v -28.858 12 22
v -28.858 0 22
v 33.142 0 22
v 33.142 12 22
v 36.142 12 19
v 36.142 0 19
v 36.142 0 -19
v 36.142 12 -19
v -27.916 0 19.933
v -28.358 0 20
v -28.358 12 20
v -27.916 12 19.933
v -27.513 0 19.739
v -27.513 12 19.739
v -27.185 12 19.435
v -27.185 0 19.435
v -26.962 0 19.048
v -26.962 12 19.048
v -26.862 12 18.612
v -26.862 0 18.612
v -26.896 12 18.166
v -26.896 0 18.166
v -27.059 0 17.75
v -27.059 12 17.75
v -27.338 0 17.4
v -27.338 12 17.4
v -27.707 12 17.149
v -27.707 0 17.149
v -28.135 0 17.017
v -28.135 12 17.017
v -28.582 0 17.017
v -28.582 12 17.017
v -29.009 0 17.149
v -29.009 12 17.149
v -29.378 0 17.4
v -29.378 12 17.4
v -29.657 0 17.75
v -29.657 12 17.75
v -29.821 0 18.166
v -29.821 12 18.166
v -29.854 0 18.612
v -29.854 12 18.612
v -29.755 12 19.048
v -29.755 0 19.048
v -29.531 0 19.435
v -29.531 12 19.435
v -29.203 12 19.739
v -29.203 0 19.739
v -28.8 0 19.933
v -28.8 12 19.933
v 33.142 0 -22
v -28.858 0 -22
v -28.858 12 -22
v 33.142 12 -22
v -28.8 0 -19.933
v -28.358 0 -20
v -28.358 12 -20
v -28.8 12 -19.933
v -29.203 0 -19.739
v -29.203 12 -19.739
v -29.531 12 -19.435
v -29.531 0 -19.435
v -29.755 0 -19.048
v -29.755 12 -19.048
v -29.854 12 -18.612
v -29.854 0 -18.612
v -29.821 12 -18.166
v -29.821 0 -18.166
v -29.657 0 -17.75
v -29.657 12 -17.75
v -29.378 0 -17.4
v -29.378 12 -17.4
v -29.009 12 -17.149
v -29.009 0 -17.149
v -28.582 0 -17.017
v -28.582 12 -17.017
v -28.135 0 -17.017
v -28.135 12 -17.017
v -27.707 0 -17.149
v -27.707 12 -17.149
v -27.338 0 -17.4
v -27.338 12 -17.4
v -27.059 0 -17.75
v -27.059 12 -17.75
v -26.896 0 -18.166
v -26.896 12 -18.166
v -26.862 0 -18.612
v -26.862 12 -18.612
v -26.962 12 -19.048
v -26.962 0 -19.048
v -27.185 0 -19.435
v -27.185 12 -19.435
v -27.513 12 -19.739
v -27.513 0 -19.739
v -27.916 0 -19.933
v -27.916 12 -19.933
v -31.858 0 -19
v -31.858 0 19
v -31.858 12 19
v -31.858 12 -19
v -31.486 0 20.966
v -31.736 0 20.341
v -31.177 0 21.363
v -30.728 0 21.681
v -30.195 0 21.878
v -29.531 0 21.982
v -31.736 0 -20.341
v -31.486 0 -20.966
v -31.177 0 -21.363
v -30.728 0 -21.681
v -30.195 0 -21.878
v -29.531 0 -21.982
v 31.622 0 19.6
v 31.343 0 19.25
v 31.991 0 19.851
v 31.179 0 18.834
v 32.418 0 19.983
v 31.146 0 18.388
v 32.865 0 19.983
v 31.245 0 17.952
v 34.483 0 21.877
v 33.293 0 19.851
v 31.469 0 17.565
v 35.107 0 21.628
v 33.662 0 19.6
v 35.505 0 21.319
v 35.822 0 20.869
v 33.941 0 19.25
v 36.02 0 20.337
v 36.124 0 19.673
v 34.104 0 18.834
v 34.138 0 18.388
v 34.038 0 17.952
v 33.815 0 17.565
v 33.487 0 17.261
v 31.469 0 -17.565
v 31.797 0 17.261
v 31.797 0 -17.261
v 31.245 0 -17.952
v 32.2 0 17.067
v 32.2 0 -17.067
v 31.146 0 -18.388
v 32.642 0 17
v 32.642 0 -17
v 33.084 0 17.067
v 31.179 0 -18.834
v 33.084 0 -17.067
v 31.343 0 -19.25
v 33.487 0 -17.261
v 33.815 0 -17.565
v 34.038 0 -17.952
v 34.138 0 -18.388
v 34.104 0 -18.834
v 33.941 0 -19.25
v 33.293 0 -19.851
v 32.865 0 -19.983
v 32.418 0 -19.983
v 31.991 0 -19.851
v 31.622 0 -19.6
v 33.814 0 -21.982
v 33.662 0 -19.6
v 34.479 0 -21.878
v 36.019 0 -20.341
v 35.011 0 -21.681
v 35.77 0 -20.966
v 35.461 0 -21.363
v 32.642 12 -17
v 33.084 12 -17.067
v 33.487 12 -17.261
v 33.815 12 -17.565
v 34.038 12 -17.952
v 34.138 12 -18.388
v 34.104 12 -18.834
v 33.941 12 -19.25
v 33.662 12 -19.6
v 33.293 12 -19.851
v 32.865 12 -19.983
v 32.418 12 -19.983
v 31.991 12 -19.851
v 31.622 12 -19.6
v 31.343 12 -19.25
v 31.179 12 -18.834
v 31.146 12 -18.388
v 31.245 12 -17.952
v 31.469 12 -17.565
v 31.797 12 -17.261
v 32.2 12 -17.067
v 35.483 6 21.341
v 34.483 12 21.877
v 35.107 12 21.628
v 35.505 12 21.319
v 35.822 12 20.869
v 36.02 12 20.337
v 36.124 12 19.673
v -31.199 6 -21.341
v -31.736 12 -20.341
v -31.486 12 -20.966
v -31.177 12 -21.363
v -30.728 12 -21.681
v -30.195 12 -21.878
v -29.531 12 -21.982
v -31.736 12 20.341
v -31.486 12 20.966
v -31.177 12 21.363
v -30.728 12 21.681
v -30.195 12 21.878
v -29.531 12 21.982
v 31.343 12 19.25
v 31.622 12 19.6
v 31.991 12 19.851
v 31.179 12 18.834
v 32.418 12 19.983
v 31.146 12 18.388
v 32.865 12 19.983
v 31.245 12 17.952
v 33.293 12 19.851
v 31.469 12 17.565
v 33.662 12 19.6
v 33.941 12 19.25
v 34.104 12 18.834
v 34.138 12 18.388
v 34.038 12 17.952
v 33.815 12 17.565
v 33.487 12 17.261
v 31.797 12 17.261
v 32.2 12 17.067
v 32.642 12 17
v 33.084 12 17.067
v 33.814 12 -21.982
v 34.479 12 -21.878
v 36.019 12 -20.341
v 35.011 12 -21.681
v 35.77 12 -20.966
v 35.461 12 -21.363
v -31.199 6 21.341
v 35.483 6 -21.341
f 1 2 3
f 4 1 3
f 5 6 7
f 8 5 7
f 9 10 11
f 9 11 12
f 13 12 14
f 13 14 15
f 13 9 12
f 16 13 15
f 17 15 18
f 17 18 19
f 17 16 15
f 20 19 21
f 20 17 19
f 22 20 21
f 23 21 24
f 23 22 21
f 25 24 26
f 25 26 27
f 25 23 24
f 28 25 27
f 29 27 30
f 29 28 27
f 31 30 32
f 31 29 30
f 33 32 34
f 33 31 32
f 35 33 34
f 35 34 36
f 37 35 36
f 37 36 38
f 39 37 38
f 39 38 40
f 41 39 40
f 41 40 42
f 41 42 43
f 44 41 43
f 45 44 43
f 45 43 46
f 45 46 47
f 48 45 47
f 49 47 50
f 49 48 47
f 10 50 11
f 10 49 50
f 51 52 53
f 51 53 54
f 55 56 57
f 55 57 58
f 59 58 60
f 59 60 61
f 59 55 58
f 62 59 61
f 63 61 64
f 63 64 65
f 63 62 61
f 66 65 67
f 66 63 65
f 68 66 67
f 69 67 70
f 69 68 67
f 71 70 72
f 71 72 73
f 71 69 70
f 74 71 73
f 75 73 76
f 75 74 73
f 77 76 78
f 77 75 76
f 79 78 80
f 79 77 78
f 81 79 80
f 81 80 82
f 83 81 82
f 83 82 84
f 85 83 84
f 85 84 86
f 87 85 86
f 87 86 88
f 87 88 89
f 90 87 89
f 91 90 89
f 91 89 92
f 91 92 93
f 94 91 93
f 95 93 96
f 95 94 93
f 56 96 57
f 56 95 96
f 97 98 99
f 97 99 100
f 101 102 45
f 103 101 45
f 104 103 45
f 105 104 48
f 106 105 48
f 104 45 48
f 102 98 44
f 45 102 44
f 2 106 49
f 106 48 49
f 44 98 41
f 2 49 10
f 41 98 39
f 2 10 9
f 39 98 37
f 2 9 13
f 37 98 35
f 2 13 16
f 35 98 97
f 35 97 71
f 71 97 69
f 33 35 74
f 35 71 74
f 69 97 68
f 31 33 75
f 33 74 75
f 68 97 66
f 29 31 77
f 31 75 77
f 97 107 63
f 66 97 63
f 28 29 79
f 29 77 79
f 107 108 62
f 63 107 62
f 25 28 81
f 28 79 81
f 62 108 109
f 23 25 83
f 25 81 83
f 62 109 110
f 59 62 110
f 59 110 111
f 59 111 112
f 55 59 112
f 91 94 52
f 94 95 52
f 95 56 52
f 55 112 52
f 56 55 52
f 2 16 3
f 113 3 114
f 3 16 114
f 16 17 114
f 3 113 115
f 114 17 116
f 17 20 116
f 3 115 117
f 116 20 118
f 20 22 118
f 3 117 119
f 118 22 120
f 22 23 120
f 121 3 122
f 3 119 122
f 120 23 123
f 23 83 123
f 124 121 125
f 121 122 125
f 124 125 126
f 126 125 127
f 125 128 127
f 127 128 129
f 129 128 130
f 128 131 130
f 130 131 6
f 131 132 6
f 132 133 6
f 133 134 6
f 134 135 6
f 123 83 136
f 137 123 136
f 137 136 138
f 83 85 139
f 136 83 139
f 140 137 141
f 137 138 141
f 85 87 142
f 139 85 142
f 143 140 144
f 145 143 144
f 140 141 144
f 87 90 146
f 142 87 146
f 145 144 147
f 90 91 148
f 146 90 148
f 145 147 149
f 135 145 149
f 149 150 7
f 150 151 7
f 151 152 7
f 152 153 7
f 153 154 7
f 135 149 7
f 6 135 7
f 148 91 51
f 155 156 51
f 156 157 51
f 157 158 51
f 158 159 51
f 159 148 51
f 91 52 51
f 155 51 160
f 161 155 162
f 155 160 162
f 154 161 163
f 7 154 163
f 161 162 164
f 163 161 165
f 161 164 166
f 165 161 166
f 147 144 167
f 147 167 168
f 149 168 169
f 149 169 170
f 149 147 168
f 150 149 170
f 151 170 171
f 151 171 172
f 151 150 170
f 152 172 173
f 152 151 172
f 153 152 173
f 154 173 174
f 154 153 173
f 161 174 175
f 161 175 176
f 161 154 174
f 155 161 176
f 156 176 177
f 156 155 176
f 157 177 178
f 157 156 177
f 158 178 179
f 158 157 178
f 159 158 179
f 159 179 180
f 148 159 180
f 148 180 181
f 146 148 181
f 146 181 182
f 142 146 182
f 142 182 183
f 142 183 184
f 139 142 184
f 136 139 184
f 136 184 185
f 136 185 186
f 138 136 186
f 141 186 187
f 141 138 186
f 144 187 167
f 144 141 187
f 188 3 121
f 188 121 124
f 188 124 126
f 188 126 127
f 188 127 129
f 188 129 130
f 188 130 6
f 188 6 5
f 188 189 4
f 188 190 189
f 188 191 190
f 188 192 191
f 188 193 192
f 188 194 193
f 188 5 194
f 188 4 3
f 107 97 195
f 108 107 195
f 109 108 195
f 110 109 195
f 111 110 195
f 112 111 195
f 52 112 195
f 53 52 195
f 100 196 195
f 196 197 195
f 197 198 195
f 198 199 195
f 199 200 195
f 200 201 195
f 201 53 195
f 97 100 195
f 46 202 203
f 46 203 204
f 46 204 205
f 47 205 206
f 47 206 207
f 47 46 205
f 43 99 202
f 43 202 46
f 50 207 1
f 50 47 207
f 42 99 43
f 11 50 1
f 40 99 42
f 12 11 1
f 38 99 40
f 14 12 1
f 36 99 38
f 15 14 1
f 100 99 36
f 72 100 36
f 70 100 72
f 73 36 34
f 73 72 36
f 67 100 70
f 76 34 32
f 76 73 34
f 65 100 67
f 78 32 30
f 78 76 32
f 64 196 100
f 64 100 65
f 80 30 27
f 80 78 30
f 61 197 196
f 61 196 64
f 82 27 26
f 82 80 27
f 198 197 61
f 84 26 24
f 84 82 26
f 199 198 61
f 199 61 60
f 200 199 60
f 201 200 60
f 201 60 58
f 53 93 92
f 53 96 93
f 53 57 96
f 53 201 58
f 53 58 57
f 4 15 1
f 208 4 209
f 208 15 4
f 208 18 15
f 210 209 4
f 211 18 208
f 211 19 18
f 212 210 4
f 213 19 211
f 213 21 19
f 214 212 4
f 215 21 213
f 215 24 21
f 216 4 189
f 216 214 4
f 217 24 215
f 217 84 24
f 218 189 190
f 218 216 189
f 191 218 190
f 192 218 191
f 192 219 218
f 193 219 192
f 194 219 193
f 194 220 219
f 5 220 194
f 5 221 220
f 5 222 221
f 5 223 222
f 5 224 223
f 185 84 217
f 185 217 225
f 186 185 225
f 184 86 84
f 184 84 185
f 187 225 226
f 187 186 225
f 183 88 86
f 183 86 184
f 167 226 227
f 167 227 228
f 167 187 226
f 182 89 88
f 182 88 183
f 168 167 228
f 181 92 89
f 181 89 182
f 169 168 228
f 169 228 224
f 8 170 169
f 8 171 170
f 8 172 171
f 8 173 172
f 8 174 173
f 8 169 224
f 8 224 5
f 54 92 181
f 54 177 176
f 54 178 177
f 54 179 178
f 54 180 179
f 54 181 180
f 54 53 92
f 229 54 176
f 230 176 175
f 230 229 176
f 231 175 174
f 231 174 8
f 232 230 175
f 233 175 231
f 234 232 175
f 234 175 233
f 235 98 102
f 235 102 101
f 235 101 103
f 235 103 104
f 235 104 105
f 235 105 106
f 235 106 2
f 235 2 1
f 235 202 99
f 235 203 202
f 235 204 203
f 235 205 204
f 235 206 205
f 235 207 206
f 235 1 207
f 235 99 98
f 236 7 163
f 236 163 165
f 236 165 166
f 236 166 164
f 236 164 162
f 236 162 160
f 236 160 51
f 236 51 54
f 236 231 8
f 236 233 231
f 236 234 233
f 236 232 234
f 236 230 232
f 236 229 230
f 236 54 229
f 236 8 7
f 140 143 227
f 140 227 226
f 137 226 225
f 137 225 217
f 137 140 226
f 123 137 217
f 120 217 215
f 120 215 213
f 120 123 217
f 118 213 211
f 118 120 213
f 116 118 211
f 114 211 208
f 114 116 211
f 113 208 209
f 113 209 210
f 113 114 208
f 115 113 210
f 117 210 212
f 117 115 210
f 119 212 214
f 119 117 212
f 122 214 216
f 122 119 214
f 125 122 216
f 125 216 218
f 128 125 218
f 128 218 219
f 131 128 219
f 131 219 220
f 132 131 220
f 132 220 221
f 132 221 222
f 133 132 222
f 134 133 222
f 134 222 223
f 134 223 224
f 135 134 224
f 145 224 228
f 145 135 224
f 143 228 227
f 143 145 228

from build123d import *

# Parameters (mm, degrees)
SKETCH_1_W      = 68
SKETCH_1_H      = 44
SKETCH_1_R      = 1.5
EXTRUDE_1_DEPTH = 12
FILLET_1_SIZE   = 3


with BuildPart() as part:
    # 草图1 → 凸台-拉伸1 (new body)
    with BuildSketch(Plane(origin=(0, 0, 0), x_dir=(1, 0, 0), z_dir=(0, 1, 0))):
        with Locations((2.141772152, 0)):
            Rectangle(SKETCH_1_W, SKETCH_1_H)
        with Locations(Location((-28.358227848, -18.5, 0), (0, 0, 270))):
            Circle(SKETCH_1_R, mode=Mode.SUBTRACT)
        with Locations(Location((32.641772152, -18.5, 0), (0, 0, 90))):
            Circle(SKETCH_1_R, mode=Mode.SUBTRACT)
        with Locations(Location((32.641772152, 18.5, 0), (0, 0, 270))):
            Circle(SKETCH_1_R, mode=Mode.SUBTRACT)
        with Locations(Location((-28.358227848, 18.5, 0), (0, 0, 90))):
            Circle(SKETCH_1_R, mode=Mode.SUBTRACT)
    extrude(amount=EXTRUDE_1_DEPTH)

    # 圆角1
    # a fillet whose section is not a circle: 3 mm, written as the material it takes off along each edge
    with BuildSketch(Plane(origin=(-31.858227848, -7.5, -22), x_dir=(1, 0, 0), z_dir=(0, 1, 0))) as fillet_1_piece_1:
        with BuildLine():
            add(Edge.make_bspline([(FILLET_1_SIZE, 0), (FILLET_1_SIZE * 0.831801948466, 0), (FILLET_1_SIZE * 0.663603896932, 0), (FILLET_1_SIZE * 0.292893218813, -FILLET_1_SIZE * 0.0716919198361), (FILLET_1_SIZE * 0.0716919198361, -FILLET_1_SIZE * 0.292893218813), (0, -FILLET_1_SIZE * 0.663603896932), (0, -FILLET_1_SIZE * 0.831801948466), (0, -FILLET_1_SIZE)], knots=[0, 0, 0, 0, 0, 0, 0.5, 0.5, 1, 1, 1, 1, 1, 1], degree=5))
            Line((0, -FILLET_1_SIZE), (0, 0))
            Line((0, 0), (FILLET_1_SIZE, 0))
        make_face()
    extrude(amount=27, mode=Mode.SUBTRACT)
    with BuildSketch(Plane(origin=(36.141772152, -7.5, -22), x_dir=(-1, 0, 0), z_dir=(0, 1, 0)), Plane(origin=(-31.858227848, -7.5, 22), x_dir=(1, 0, 0), z_dir=(0, 1, 0)), Plane(origin=(36.141772152, -7.5, 22), x_dir=(0, 0, -1), z_dir=(0, 1, 0))) as fillet_1_piece_2:
        with BuildLine():
            add(Edge.make_bspline([(FILLET_1_SIZE, 0), (FILLET_1_SIZE * 0.831801948466, 0), (FILLET_1_SIZE * 0.663603896932, 0), (FILLET_1_SIZE * 0.292893218813, FILLET_1_SIZE * 0.0716919198361), (FILLET_1_SIZE * 0.0716919198361, FILLET_1_SIZE * 0.292893218813), (0, FILLET_1_SIZE * 0.663603896932), (0, FILLET_1_SIZE * 0.831801948466), (0, FILLET_1_SIZE)], knots=[0, 0, 0, 0, 0, 0, 0.5, 0.5, 1, 1, 1, 1, 1, 1], degree=5))
            Line((0, FILLET_1_SIZE), (0, 0))
            Line((0, 0), (FILLET_1_SIZE, 0))
        make_face()
    extrude(amount=27, mode=Mode.SUBTRACT)


solid = part.part
